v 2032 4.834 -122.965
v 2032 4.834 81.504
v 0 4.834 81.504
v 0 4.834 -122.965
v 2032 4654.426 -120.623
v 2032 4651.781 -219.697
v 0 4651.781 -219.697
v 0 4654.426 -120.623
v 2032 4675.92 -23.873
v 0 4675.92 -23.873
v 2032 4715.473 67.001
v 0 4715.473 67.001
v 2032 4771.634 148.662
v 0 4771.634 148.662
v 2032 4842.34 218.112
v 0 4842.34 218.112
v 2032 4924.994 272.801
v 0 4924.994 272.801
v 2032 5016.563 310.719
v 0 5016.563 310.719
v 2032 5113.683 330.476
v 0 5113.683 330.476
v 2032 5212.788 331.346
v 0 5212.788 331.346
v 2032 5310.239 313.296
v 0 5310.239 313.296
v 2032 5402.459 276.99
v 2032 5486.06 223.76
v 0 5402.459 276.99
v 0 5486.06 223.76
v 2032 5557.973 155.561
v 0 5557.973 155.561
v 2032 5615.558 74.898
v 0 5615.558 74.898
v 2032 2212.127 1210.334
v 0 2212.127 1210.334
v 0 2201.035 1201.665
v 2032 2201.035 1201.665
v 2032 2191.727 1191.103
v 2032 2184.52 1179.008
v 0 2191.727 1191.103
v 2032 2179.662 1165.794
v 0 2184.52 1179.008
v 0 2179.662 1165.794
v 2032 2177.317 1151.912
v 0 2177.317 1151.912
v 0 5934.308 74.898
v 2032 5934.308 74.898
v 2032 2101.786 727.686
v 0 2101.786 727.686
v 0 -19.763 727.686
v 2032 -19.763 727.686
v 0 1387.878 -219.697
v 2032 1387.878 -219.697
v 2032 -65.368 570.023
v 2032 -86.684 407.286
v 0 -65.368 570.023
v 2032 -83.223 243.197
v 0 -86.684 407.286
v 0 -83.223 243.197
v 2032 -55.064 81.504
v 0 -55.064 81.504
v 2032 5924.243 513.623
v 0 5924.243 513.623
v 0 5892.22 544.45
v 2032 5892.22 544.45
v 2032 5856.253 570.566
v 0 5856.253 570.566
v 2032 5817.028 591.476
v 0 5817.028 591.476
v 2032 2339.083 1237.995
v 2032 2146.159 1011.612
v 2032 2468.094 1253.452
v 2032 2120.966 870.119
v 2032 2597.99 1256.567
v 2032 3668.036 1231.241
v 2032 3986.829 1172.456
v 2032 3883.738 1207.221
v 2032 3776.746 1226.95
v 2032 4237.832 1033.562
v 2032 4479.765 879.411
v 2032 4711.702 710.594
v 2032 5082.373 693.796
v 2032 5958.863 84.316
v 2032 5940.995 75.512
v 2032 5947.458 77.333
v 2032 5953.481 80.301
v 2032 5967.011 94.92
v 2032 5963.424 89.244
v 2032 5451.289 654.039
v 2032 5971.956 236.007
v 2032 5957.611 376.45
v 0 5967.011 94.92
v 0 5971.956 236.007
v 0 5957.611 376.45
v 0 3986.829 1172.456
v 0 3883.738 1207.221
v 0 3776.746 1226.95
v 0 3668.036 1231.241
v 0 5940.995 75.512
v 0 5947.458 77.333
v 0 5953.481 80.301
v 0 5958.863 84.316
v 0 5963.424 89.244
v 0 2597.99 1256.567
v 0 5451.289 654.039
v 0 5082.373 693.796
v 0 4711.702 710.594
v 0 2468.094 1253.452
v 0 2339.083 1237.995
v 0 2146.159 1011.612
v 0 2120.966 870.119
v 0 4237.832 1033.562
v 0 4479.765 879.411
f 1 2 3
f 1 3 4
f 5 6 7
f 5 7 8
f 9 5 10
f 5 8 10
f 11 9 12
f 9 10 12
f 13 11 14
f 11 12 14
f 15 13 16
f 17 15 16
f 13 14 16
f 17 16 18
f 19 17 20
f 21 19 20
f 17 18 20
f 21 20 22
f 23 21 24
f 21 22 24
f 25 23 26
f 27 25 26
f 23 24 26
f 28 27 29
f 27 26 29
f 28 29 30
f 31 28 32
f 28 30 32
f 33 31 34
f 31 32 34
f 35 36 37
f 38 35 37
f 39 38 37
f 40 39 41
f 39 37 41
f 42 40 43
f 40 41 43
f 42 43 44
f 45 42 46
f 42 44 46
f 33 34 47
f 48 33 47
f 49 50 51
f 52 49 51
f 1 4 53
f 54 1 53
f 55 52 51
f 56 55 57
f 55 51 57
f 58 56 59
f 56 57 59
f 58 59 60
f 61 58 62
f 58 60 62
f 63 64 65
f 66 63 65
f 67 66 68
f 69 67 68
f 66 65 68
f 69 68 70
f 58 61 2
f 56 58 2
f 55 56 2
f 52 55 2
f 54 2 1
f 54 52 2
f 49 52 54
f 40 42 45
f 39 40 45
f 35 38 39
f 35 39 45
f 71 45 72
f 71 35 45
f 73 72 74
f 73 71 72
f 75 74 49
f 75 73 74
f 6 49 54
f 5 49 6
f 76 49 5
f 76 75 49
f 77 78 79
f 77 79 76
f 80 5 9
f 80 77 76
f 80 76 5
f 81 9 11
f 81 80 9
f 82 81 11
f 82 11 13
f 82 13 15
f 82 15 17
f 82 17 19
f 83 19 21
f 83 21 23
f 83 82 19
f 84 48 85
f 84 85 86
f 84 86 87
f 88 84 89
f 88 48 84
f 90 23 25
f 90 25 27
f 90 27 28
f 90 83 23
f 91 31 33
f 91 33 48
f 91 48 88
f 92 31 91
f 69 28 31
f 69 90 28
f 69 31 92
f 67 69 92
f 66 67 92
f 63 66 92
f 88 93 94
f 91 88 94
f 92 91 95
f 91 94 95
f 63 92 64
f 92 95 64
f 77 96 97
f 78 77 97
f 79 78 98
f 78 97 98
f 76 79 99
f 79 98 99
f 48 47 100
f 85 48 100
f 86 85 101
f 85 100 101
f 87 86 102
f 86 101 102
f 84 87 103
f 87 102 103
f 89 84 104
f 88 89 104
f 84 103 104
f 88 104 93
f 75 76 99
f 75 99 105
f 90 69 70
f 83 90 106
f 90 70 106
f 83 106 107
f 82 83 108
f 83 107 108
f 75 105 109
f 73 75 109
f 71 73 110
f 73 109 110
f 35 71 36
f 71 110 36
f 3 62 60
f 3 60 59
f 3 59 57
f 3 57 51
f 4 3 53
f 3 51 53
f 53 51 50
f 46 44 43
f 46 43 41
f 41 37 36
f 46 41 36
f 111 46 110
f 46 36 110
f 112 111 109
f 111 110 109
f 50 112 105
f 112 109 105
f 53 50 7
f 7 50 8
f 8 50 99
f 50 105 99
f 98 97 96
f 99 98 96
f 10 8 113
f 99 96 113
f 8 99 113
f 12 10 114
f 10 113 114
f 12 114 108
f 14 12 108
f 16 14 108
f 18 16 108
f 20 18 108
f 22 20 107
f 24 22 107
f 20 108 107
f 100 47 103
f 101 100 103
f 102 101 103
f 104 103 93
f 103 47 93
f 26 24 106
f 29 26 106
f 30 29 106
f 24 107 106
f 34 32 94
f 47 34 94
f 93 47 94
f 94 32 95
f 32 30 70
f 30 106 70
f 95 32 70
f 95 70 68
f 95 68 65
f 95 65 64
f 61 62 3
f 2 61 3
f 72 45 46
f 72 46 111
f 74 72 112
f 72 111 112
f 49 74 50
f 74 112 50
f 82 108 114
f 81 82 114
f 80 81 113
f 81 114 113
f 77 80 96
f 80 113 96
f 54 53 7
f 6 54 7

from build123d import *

# Parameters (mm, degrees)
F2_DEPTH = 2032


with BuildPart() as f2:
    # F1 (on Right) → F2 (new body)
    with BuildSketch(Plane.YZ):
        with BuildLine():
            Line((2101.785505274, 727.6855798425), (-19.7628020611, 727.6855798425))
            ThreePointArc((-19.7628020611, 727.6855798425), (-86.683913356, 407.2864265747), (-55.0640291836, 81.5039293828))
            Line((-55.0640291836, 81.5039293828), (4.8336413387, 81.5039293828))
            Line((4.8336413387, 81.5039293828), (4.8336413387, -122.9648201392))
            Line((4.8336413387, -122.9648201392), (1387.8776439164, -219.6968405173))
            Line((1387.8776439164, -219.6968405173), (2127.7049191926, -219.6968405173))
            ThreePointArc((2127.7049191926, -219.6968405173), (2081.5219811254, 253.0854160445), (2101.785505274, 727.6855798426))
        make_face()
        with BuildLine():
            ThreePointArc((2177.317456219, 1151.9124599161), (2132.8138260133, 940.9986331775), (2101.785505274, 727.6855798426))
            Line((2101.785505274, 727.6855798425), (2121.7959680293, 727.6855798425))
            ThreePointArc((2121.7959680293, 727.6855798425), (2094.9083803327, 253.8082407133), (2127.7049191926, -219.6968405173))
            Line((2127.7049191926, -219.6968405173), (4651.78068063, -219.6968405173))
            ThreePointArc((4651.78068063, -219.6968405173), (5016.5627272177, 310.719477874), (5615.5582227442, 74.8979168))
            Line((5615.5582227442, 74.8979168), (5934.3084523646, 74.8979168))
            ThreePointArc((5934.3084523646, 74.8979168), (5953.4810211659, 80.300832077), (5967.0113954416, 94.9195823619))
            ThreePointArc((5967.0113954416, 94.9195823619), (5967.1863626582, 306.4736463751), (5924.2433938852, 513.6234811494))
            ThreePointArc((5924.2433938852, 513.6234811494), (5874.6880783094, 558.1300327479), (5817.0284662119, 591.4756706902))
            ThreePointArc((5817.0284662119, 591.4756706902), (5267.1396396799, 676.7800301244), (4711.701813685, 710.5938843438))
            ThreePointArc((4711.701813685, 710.5938843438), (4359.9908008622, 958.3584005149), (3986.8287477365, 1172.4564484307))
            ThreePointArc((3986.8287477365, 1172.4564484307), (3830.5944128843, 1218.9973597292), (3668.0357456207, 1231.2408685684))
            Line((3668.0357456207, 1231.2408685684), (2597.9900360107, 1256.5667629242))
            ThreePointArc((2597.9900360107, 1256.5667629242), (2403.4041422687, 1247.2600489767), (2212.1274471283, 1210.3343009949))
            ThreePointArc((2212.1274471283, 1210.3343009949), (2187.8435508346, 1185.2220954437), (2177.317456219, 1151.9124599161))
        make_face()
        with BuildLine():
            Line((2121.7959680293, 727.6855798425), (2101.785505274, 727.6855798425))
            ThreePointArc((2101.785505274, 727.6855798426), (2081.5219811254, 253.0854160445), (2127.7049191926, -219.6968405173))
            ThreePointArc((2127.7049191926, -219.6968405173), (2094.9083803327, 253.8082407133), (2121.7959680293, 727.6855798425))
        make_face()
    extrude(amount=F2_DEPTH)


solid = f2.part
